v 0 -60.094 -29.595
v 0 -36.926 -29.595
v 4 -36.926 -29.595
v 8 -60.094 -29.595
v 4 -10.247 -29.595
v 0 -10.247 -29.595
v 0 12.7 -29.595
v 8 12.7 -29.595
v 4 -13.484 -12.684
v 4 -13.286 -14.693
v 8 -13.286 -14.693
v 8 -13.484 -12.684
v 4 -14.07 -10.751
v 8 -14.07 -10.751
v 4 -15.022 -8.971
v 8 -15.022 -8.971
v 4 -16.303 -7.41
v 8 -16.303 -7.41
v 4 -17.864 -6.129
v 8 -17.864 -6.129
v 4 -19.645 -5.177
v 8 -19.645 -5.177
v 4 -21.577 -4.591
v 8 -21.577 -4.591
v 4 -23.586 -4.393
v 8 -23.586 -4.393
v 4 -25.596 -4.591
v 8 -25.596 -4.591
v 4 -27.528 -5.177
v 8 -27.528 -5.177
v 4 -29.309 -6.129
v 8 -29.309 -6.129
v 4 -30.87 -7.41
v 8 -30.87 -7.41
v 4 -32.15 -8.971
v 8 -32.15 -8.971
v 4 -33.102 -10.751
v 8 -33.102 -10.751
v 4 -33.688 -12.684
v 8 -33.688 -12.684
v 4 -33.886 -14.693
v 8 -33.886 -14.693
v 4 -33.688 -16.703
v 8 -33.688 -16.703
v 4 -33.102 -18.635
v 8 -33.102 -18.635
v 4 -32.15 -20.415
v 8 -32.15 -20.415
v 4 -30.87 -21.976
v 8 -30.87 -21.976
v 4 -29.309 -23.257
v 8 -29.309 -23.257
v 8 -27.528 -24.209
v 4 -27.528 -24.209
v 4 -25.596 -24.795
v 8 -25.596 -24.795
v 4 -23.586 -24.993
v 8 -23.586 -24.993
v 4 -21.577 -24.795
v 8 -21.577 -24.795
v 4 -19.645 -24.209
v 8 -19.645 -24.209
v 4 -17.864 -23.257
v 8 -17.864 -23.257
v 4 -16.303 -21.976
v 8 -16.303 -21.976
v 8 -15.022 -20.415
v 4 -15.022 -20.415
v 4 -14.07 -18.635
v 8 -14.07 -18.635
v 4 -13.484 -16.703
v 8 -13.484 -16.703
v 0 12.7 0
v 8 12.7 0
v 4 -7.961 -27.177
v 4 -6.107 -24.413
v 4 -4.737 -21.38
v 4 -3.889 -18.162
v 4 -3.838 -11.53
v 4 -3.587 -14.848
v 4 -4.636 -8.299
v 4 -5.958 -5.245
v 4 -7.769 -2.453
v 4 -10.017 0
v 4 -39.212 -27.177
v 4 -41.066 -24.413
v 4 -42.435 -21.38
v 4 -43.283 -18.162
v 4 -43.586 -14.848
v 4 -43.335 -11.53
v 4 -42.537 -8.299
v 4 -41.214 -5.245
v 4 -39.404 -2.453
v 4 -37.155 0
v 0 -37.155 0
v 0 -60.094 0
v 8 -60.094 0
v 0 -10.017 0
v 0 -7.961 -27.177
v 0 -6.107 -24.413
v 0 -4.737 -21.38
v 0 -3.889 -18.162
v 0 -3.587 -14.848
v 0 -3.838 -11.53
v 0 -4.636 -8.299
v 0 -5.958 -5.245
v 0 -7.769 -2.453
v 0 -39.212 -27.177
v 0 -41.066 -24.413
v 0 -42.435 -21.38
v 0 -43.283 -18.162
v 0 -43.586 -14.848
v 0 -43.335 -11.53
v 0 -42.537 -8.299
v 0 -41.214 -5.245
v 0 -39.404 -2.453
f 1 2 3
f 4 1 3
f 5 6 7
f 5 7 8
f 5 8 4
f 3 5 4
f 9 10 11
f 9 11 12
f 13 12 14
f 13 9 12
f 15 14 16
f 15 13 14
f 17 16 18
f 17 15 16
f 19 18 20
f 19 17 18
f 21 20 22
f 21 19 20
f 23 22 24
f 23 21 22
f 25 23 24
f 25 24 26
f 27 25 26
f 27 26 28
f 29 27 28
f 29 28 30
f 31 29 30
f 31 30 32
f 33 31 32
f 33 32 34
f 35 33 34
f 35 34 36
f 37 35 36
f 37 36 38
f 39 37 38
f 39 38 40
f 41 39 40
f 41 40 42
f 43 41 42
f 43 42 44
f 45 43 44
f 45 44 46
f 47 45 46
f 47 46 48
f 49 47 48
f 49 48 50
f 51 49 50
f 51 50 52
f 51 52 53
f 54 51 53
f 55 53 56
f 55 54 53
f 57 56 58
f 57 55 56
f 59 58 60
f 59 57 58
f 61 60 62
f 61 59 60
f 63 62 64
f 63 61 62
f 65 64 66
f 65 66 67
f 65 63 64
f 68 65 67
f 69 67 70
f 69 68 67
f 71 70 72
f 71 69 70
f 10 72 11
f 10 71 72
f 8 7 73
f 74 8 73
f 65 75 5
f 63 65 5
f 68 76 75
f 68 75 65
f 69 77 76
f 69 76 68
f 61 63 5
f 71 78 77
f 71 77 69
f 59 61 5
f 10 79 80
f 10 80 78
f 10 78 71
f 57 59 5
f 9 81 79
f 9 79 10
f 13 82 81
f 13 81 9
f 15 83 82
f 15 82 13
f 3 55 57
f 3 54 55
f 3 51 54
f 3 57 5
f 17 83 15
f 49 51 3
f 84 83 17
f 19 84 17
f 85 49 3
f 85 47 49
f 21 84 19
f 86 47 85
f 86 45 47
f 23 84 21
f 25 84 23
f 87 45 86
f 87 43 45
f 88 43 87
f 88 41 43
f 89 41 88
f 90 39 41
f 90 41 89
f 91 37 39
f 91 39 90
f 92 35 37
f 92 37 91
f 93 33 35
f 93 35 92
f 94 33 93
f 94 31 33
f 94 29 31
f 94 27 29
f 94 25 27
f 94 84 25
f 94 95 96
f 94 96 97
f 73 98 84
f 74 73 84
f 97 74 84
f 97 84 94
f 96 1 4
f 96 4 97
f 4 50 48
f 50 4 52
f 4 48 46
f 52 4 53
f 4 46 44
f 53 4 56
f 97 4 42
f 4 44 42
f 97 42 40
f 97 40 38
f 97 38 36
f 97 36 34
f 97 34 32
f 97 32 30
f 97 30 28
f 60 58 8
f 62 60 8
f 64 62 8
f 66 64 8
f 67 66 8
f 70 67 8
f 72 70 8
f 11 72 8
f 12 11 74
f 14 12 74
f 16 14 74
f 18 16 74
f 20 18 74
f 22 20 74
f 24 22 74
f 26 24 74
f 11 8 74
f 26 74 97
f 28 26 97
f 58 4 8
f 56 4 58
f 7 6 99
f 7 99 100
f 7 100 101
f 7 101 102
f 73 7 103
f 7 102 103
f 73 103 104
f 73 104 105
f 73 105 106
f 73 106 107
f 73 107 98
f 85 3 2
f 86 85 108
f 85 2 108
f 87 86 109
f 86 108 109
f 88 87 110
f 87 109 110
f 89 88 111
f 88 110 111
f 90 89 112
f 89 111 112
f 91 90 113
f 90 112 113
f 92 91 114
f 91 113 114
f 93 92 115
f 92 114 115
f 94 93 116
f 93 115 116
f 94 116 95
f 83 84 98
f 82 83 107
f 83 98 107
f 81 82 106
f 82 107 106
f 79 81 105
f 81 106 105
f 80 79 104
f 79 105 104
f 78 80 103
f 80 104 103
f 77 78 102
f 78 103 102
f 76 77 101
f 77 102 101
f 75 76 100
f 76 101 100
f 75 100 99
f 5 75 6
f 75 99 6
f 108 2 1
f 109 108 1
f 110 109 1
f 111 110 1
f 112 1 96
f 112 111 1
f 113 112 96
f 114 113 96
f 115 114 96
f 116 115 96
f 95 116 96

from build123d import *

# Parameters (mm, degrees)
F0_W     = 53.743943572
F0_H     = 29.5948740095
F0_R     = 10.3
F1_DEPTH = 8
F2_R     = 20
F3_DEPTH = 4
F4_DEPTH = 12.7
F5_DEPTH = 6.35


with BuildPart() as f1:
    # F0 (on Right) → F1 (new body)
    with BuildSketch(Plane.YZ):
        with Locations((-26.871971786, -14.7974370047)):
            Rectangle(F0_W, F0_H)
        with Locations((-23.5863085836, -14.6930906922)):
            Circle(F0_R, mode=Mode.SUBTRACT)
    extrude(amount=F1_DEPTH)

    # F2 (on face) → F3 (cut)
    with BuildSketch(Plane(origin=(0, 0, 0), x_dir=(0, -1, 0), z_dir=(-1, 0, 0))):
        with Locations((23.5863085836, -14.6930906922)):
            Circle(F2_R)
    extrude(amount=-F3_DEPTH, mode=Mode.SUBTRACT)

    # F4 (add): a face of the model
    f4_faces = [f1.faces().sort_by_distance(p)[0] for p in [
        (4, 0, -14.7974370047),
    ]]
    extrude(f4_faces, amount=F4_DEPTH)

    # F5 (add): a face of the model
    f5_faces = [f1.faces().sort_by_distance(p)[0] for p in [
        (4, -53.743943572, -14.7974370047),
    ]]
    extrude(f5_faces, amount=F5_DEPTH)


solid = f1.part
